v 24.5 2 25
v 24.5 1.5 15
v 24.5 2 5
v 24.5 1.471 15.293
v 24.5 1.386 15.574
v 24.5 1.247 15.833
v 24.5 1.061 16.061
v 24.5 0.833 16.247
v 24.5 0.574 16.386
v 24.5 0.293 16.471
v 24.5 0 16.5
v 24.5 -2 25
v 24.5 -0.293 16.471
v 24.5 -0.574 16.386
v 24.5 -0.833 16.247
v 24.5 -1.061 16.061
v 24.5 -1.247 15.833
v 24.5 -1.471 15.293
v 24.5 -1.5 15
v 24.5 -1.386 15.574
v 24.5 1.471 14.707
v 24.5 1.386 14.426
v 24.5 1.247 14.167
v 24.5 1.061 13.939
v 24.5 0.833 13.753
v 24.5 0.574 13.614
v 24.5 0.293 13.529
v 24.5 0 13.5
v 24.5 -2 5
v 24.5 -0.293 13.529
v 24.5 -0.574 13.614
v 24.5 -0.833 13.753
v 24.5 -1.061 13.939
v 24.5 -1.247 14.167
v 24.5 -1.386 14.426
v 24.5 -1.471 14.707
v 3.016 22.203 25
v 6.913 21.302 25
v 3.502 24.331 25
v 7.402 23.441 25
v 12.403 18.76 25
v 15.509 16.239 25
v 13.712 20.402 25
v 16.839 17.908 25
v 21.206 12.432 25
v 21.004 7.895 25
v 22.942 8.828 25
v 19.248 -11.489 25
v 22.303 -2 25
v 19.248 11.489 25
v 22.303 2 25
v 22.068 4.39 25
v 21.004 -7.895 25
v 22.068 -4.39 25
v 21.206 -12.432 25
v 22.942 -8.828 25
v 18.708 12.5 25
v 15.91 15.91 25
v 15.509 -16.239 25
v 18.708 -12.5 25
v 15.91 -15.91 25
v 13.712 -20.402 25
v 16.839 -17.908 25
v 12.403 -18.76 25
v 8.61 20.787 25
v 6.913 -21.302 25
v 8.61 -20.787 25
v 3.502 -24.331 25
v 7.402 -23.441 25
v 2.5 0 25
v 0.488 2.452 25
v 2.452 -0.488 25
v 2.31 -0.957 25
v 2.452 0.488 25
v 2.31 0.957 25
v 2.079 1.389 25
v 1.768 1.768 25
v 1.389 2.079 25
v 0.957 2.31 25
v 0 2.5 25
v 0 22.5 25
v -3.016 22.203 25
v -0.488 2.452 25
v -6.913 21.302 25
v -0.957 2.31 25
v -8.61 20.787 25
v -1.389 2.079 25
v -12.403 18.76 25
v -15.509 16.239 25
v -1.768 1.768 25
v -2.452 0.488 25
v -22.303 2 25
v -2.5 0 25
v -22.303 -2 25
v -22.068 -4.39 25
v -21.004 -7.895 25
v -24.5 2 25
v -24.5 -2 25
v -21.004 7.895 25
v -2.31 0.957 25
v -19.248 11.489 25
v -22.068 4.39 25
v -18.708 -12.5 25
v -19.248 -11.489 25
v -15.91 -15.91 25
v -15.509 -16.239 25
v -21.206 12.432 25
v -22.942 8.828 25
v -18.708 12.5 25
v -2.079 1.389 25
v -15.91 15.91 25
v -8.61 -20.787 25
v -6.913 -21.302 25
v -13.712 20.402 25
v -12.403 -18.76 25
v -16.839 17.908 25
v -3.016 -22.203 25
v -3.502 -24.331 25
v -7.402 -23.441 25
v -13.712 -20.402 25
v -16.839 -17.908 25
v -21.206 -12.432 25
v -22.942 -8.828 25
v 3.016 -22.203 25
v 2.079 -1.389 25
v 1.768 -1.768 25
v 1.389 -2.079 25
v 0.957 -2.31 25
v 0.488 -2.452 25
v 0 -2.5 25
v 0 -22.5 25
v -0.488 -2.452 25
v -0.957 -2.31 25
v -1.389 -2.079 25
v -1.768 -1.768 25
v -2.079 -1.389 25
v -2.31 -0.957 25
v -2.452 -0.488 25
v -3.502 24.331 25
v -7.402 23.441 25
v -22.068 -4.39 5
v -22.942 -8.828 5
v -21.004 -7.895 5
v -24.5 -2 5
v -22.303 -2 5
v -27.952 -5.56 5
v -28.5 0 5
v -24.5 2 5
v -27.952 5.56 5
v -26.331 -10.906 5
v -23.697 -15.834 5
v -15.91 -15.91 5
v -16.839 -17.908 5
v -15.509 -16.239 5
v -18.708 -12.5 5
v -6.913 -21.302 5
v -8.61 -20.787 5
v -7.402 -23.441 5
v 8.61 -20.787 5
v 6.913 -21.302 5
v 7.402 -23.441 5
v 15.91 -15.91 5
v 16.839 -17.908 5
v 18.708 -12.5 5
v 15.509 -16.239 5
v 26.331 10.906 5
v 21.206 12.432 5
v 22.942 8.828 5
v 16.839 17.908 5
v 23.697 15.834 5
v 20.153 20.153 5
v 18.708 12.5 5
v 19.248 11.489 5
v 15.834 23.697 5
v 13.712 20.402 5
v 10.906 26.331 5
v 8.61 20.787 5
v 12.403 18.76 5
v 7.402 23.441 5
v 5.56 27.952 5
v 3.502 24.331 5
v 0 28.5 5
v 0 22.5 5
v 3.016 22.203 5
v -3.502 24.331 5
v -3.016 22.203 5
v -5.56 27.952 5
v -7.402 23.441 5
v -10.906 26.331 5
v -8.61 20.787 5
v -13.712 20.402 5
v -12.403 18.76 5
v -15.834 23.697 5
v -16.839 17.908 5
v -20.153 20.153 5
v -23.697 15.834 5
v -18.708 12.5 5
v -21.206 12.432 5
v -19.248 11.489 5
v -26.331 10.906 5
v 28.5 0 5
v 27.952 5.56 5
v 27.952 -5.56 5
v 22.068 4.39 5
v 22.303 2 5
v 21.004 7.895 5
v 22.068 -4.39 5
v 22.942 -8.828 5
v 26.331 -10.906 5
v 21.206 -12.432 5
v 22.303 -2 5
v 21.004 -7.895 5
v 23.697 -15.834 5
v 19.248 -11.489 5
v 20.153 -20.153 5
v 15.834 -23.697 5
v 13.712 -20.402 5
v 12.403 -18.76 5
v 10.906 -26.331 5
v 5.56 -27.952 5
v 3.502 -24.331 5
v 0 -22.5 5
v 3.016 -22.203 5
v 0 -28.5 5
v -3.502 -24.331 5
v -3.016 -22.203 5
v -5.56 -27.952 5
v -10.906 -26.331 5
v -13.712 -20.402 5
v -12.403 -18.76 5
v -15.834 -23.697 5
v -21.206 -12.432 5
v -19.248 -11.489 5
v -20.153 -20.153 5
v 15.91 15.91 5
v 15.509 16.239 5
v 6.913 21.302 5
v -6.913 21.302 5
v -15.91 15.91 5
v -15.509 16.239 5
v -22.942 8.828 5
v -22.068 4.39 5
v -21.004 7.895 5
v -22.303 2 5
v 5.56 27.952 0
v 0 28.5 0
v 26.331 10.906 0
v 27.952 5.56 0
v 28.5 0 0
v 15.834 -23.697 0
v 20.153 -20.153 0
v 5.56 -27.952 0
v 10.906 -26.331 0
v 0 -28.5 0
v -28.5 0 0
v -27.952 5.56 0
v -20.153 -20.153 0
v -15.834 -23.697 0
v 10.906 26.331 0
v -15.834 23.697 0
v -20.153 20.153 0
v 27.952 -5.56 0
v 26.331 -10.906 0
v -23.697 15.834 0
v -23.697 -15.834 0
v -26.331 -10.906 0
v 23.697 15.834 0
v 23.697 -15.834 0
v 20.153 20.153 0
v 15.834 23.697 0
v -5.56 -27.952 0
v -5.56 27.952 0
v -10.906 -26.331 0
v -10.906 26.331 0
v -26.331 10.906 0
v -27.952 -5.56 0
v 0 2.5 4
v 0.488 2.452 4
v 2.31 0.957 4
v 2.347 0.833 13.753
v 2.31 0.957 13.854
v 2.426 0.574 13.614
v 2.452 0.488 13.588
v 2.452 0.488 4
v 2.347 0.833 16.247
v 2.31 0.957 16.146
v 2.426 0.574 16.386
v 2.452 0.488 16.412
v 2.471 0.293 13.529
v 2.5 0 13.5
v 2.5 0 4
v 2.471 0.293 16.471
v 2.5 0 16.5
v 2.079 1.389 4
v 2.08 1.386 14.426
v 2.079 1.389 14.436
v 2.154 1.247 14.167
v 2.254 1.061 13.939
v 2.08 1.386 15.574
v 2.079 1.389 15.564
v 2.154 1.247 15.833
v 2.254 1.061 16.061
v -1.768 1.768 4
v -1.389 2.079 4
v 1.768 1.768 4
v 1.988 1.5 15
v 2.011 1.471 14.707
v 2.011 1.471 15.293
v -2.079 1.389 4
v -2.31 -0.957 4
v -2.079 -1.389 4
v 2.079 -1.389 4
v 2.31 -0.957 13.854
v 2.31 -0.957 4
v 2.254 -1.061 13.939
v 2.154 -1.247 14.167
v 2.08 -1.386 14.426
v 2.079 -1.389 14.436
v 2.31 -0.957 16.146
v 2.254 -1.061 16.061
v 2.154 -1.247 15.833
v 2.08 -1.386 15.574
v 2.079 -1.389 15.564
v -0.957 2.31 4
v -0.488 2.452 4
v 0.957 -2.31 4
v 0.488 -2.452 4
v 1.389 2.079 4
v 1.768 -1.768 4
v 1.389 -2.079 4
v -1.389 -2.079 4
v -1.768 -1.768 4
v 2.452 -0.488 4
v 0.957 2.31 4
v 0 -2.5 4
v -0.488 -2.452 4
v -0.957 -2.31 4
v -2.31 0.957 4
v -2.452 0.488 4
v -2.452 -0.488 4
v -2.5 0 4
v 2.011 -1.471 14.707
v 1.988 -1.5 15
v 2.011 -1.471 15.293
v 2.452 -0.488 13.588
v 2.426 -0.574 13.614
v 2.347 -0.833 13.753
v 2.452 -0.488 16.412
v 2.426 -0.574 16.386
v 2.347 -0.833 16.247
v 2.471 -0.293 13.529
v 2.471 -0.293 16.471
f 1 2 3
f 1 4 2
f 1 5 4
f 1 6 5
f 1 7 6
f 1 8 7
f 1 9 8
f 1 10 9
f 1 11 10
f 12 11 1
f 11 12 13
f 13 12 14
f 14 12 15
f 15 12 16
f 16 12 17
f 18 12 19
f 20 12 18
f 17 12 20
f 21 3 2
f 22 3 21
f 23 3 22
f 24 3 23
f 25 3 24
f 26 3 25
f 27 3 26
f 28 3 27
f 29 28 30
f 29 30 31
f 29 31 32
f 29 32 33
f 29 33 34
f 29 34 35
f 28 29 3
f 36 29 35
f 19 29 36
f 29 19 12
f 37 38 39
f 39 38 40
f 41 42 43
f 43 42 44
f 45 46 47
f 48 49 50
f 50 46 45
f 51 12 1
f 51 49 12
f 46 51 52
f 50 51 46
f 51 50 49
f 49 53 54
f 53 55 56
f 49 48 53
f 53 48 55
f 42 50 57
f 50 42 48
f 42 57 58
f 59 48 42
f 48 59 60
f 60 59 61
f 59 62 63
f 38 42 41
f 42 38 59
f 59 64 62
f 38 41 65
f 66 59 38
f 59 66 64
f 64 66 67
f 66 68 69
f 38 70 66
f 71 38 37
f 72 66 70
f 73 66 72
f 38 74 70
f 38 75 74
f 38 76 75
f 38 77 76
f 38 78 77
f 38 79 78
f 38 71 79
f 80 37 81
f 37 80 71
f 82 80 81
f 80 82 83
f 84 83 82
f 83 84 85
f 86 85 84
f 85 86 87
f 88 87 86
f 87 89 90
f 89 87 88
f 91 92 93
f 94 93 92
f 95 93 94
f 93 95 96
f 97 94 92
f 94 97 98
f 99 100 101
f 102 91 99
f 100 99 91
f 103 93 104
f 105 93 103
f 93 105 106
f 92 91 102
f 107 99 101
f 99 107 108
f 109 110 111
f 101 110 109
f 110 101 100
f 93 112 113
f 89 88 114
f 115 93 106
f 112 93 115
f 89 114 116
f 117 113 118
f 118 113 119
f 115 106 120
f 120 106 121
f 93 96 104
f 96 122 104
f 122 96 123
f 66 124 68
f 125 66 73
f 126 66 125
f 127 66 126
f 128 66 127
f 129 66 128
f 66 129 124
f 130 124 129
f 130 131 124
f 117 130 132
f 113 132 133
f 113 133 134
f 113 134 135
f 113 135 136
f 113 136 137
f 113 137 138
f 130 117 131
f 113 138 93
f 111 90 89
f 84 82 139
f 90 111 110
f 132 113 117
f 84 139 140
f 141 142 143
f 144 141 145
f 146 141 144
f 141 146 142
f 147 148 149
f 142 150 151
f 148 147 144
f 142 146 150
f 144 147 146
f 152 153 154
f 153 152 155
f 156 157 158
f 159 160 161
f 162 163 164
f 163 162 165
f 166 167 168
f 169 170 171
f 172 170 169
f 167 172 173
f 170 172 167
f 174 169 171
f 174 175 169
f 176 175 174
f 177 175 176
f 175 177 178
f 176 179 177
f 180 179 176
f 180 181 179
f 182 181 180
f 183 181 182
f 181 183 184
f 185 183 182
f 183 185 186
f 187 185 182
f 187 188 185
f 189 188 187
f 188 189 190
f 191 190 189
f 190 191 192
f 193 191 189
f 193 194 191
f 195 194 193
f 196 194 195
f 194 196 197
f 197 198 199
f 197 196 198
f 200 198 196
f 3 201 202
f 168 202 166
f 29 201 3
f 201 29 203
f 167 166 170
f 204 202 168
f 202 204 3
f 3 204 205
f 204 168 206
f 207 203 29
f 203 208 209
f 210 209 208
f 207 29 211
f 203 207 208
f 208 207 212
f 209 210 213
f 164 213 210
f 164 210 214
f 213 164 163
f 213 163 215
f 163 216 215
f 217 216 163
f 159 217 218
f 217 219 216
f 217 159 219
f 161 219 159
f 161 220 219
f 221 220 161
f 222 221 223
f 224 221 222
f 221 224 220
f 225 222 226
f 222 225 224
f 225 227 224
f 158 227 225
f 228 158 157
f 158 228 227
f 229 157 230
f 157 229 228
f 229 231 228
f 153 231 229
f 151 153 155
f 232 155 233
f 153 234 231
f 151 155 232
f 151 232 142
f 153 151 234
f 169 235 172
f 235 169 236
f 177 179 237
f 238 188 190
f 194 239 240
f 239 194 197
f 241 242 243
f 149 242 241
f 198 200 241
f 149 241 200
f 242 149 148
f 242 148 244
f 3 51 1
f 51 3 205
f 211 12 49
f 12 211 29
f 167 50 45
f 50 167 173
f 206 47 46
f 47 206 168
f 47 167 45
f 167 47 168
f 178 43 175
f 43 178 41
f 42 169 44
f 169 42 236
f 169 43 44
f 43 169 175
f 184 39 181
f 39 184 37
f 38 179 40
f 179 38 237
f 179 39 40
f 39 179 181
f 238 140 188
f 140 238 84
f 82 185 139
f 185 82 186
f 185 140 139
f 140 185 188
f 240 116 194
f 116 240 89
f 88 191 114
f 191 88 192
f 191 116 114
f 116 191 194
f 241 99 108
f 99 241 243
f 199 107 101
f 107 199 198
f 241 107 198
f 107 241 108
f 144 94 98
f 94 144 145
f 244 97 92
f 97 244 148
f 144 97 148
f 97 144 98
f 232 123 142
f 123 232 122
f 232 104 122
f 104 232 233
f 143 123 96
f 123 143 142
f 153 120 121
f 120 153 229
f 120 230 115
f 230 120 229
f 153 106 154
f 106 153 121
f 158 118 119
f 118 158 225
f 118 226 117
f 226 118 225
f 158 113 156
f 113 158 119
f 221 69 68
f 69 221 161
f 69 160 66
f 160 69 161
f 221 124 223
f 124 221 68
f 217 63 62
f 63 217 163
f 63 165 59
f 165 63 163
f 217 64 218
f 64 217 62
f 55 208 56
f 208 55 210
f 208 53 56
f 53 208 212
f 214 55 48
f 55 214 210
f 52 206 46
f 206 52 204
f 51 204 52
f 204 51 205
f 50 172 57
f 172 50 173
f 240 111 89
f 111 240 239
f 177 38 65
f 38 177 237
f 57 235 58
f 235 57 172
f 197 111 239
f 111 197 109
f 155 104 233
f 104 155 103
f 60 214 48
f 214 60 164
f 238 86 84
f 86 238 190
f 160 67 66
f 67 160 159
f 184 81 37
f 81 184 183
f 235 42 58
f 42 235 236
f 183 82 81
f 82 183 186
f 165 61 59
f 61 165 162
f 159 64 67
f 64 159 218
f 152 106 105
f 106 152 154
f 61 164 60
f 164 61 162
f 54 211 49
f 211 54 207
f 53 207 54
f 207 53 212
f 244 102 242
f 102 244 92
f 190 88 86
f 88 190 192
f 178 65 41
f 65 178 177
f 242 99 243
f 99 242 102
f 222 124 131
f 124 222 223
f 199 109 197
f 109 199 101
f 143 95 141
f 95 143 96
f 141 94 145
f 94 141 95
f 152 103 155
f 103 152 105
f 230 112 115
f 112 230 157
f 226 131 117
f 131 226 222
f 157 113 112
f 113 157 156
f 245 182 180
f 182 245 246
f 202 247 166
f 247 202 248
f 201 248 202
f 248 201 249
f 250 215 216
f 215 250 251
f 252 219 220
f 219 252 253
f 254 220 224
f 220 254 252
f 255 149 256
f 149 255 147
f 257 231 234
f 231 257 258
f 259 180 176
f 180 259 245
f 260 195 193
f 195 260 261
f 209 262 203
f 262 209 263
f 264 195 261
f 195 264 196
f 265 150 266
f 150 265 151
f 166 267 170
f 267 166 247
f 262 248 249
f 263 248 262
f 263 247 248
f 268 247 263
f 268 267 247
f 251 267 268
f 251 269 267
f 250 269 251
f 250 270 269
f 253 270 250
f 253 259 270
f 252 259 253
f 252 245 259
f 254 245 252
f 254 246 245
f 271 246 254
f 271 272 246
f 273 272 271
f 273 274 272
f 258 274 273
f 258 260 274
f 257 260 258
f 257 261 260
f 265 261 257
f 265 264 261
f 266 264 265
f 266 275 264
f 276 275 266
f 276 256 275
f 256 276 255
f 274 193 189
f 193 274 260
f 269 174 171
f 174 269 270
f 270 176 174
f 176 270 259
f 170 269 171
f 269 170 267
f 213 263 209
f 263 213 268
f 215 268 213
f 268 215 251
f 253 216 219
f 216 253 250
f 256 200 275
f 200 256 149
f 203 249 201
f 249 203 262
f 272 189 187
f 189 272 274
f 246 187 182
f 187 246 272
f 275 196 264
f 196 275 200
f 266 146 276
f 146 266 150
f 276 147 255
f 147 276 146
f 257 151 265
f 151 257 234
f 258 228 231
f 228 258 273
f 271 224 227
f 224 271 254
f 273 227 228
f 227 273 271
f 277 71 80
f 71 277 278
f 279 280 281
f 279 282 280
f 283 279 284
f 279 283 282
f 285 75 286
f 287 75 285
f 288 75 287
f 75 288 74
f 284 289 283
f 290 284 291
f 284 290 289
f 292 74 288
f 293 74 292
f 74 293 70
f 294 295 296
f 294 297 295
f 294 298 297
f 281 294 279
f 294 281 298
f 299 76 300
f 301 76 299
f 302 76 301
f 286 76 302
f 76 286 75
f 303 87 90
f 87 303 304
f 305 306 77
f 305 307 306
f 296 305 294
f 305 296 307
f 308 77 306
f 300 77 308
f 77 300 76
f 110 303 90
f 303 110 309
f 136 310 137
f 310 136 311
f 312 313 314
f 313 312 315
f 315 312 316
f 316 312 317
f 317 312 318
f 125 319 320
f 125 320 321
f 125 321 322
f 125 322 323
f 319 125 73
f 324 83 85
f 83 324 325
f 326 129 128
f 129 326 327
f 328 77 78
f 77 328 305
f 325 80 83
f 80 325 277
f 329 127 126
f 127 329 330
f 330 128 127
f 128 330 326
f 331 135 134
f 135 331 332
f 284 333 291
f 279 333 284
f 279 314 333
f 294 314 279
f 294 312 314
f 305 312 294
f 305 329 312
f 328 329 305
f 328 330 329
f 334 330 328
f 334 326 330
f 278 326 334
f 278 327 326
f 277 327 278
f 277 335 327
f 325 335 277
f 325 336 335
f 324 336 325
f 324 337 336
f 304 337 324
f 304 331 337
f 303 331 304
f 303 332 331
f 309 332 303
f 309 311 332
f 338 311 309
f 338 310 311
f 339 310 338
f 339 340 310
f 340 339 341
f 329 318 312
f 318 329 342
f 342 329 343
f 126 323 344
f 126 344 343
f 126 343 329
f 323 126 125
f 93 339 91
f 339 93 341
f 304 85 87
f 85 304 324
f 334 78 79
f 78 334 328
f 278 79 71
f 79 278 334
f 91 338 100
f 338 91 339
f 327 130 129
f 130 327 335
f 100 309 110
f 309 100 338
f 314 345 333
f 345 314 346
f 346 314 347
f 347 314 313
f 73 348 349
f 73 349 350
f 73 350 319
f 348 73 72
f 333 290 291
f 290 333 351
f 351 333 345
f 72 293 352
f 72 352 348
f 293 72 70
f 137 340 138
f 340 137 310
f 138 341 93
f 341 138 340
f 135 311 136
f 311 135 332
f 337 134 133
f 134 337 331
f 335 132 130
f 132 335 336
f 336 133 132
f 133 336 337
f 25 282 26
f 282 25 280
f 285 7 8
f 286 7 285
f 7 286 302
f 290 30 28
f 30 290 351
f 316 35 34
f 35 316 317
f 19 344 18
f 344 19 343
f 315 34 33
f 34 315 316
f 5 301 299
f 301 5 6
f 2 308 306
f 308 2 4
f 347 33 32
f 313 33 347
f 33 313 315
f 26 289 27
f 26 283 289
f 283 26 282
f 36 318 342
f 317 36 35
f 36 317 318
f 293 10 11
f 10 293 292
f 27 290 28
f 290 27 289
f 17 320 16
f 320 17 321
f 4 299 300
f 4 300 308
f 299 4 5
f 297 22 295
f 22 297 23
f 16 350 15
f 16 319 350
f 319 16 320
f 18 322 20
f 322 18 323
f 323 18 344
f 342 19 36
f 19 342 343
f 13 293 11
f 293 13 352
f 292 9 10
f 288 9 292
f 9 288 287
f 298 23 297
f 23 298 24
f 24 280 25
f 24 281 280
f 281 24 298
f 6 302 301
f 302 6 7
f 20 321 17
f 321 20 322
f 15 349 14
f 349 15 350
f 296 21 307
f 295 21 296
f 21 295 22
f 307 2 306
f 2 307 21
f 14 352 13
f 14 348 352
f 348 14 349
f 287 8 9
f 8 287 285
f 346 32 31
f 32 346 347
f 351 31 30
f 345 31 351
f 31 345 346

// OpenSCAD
$fn = 32;

// ----------------------------------------------------------------------
// Control knob: skirt knob with grip ribs
// ----------------------------------------------------------------------

// --- parameters (mm) ---
skirt_d = 57;             // skirt diameter
skirt_t = 5;              // skirt thickness
rib_w = 4;                // grip rib width
rib_out = 3;              // grip rib radial protrusion
n_ribs = 14;              // number of grip ribs
knob_d = 45;              // knob body diameter
knob_h = 20;              // knob body height
bore_d = 5;               // shaft bore diameter
set_d = 3;                // set screw bore diameter

rib_step = 360 / n_ribs;  // rib angular step
total_h = skirt_t + knob_h;  // overall height

difference() {
  union() {
    translate([0, 0, skirt_t]) cylinder(h = knob_h, d = knob_d);
    cylinder(h = skirt_t, d = skirt_d);
    for (i = [0 : n_ribs - 1])
      rotate([0, 0, i * rib_step])
        translate([knob_d / 2 - 1, -rib_w / 2, skirt_t])
          cube([rib_out, rib_w, knob_h]);
  }
  translate([0, 0, skirt_t - 1]) cylinder(h = knob_h + 2, d = bore_d);
  translate([-1, 0, skirt_t + knob_h / 2]) rotate([0, 90, 0])
    cylinder(h = knob_d / 2 + bore_d / 2 + 2, d = set_d);
}
